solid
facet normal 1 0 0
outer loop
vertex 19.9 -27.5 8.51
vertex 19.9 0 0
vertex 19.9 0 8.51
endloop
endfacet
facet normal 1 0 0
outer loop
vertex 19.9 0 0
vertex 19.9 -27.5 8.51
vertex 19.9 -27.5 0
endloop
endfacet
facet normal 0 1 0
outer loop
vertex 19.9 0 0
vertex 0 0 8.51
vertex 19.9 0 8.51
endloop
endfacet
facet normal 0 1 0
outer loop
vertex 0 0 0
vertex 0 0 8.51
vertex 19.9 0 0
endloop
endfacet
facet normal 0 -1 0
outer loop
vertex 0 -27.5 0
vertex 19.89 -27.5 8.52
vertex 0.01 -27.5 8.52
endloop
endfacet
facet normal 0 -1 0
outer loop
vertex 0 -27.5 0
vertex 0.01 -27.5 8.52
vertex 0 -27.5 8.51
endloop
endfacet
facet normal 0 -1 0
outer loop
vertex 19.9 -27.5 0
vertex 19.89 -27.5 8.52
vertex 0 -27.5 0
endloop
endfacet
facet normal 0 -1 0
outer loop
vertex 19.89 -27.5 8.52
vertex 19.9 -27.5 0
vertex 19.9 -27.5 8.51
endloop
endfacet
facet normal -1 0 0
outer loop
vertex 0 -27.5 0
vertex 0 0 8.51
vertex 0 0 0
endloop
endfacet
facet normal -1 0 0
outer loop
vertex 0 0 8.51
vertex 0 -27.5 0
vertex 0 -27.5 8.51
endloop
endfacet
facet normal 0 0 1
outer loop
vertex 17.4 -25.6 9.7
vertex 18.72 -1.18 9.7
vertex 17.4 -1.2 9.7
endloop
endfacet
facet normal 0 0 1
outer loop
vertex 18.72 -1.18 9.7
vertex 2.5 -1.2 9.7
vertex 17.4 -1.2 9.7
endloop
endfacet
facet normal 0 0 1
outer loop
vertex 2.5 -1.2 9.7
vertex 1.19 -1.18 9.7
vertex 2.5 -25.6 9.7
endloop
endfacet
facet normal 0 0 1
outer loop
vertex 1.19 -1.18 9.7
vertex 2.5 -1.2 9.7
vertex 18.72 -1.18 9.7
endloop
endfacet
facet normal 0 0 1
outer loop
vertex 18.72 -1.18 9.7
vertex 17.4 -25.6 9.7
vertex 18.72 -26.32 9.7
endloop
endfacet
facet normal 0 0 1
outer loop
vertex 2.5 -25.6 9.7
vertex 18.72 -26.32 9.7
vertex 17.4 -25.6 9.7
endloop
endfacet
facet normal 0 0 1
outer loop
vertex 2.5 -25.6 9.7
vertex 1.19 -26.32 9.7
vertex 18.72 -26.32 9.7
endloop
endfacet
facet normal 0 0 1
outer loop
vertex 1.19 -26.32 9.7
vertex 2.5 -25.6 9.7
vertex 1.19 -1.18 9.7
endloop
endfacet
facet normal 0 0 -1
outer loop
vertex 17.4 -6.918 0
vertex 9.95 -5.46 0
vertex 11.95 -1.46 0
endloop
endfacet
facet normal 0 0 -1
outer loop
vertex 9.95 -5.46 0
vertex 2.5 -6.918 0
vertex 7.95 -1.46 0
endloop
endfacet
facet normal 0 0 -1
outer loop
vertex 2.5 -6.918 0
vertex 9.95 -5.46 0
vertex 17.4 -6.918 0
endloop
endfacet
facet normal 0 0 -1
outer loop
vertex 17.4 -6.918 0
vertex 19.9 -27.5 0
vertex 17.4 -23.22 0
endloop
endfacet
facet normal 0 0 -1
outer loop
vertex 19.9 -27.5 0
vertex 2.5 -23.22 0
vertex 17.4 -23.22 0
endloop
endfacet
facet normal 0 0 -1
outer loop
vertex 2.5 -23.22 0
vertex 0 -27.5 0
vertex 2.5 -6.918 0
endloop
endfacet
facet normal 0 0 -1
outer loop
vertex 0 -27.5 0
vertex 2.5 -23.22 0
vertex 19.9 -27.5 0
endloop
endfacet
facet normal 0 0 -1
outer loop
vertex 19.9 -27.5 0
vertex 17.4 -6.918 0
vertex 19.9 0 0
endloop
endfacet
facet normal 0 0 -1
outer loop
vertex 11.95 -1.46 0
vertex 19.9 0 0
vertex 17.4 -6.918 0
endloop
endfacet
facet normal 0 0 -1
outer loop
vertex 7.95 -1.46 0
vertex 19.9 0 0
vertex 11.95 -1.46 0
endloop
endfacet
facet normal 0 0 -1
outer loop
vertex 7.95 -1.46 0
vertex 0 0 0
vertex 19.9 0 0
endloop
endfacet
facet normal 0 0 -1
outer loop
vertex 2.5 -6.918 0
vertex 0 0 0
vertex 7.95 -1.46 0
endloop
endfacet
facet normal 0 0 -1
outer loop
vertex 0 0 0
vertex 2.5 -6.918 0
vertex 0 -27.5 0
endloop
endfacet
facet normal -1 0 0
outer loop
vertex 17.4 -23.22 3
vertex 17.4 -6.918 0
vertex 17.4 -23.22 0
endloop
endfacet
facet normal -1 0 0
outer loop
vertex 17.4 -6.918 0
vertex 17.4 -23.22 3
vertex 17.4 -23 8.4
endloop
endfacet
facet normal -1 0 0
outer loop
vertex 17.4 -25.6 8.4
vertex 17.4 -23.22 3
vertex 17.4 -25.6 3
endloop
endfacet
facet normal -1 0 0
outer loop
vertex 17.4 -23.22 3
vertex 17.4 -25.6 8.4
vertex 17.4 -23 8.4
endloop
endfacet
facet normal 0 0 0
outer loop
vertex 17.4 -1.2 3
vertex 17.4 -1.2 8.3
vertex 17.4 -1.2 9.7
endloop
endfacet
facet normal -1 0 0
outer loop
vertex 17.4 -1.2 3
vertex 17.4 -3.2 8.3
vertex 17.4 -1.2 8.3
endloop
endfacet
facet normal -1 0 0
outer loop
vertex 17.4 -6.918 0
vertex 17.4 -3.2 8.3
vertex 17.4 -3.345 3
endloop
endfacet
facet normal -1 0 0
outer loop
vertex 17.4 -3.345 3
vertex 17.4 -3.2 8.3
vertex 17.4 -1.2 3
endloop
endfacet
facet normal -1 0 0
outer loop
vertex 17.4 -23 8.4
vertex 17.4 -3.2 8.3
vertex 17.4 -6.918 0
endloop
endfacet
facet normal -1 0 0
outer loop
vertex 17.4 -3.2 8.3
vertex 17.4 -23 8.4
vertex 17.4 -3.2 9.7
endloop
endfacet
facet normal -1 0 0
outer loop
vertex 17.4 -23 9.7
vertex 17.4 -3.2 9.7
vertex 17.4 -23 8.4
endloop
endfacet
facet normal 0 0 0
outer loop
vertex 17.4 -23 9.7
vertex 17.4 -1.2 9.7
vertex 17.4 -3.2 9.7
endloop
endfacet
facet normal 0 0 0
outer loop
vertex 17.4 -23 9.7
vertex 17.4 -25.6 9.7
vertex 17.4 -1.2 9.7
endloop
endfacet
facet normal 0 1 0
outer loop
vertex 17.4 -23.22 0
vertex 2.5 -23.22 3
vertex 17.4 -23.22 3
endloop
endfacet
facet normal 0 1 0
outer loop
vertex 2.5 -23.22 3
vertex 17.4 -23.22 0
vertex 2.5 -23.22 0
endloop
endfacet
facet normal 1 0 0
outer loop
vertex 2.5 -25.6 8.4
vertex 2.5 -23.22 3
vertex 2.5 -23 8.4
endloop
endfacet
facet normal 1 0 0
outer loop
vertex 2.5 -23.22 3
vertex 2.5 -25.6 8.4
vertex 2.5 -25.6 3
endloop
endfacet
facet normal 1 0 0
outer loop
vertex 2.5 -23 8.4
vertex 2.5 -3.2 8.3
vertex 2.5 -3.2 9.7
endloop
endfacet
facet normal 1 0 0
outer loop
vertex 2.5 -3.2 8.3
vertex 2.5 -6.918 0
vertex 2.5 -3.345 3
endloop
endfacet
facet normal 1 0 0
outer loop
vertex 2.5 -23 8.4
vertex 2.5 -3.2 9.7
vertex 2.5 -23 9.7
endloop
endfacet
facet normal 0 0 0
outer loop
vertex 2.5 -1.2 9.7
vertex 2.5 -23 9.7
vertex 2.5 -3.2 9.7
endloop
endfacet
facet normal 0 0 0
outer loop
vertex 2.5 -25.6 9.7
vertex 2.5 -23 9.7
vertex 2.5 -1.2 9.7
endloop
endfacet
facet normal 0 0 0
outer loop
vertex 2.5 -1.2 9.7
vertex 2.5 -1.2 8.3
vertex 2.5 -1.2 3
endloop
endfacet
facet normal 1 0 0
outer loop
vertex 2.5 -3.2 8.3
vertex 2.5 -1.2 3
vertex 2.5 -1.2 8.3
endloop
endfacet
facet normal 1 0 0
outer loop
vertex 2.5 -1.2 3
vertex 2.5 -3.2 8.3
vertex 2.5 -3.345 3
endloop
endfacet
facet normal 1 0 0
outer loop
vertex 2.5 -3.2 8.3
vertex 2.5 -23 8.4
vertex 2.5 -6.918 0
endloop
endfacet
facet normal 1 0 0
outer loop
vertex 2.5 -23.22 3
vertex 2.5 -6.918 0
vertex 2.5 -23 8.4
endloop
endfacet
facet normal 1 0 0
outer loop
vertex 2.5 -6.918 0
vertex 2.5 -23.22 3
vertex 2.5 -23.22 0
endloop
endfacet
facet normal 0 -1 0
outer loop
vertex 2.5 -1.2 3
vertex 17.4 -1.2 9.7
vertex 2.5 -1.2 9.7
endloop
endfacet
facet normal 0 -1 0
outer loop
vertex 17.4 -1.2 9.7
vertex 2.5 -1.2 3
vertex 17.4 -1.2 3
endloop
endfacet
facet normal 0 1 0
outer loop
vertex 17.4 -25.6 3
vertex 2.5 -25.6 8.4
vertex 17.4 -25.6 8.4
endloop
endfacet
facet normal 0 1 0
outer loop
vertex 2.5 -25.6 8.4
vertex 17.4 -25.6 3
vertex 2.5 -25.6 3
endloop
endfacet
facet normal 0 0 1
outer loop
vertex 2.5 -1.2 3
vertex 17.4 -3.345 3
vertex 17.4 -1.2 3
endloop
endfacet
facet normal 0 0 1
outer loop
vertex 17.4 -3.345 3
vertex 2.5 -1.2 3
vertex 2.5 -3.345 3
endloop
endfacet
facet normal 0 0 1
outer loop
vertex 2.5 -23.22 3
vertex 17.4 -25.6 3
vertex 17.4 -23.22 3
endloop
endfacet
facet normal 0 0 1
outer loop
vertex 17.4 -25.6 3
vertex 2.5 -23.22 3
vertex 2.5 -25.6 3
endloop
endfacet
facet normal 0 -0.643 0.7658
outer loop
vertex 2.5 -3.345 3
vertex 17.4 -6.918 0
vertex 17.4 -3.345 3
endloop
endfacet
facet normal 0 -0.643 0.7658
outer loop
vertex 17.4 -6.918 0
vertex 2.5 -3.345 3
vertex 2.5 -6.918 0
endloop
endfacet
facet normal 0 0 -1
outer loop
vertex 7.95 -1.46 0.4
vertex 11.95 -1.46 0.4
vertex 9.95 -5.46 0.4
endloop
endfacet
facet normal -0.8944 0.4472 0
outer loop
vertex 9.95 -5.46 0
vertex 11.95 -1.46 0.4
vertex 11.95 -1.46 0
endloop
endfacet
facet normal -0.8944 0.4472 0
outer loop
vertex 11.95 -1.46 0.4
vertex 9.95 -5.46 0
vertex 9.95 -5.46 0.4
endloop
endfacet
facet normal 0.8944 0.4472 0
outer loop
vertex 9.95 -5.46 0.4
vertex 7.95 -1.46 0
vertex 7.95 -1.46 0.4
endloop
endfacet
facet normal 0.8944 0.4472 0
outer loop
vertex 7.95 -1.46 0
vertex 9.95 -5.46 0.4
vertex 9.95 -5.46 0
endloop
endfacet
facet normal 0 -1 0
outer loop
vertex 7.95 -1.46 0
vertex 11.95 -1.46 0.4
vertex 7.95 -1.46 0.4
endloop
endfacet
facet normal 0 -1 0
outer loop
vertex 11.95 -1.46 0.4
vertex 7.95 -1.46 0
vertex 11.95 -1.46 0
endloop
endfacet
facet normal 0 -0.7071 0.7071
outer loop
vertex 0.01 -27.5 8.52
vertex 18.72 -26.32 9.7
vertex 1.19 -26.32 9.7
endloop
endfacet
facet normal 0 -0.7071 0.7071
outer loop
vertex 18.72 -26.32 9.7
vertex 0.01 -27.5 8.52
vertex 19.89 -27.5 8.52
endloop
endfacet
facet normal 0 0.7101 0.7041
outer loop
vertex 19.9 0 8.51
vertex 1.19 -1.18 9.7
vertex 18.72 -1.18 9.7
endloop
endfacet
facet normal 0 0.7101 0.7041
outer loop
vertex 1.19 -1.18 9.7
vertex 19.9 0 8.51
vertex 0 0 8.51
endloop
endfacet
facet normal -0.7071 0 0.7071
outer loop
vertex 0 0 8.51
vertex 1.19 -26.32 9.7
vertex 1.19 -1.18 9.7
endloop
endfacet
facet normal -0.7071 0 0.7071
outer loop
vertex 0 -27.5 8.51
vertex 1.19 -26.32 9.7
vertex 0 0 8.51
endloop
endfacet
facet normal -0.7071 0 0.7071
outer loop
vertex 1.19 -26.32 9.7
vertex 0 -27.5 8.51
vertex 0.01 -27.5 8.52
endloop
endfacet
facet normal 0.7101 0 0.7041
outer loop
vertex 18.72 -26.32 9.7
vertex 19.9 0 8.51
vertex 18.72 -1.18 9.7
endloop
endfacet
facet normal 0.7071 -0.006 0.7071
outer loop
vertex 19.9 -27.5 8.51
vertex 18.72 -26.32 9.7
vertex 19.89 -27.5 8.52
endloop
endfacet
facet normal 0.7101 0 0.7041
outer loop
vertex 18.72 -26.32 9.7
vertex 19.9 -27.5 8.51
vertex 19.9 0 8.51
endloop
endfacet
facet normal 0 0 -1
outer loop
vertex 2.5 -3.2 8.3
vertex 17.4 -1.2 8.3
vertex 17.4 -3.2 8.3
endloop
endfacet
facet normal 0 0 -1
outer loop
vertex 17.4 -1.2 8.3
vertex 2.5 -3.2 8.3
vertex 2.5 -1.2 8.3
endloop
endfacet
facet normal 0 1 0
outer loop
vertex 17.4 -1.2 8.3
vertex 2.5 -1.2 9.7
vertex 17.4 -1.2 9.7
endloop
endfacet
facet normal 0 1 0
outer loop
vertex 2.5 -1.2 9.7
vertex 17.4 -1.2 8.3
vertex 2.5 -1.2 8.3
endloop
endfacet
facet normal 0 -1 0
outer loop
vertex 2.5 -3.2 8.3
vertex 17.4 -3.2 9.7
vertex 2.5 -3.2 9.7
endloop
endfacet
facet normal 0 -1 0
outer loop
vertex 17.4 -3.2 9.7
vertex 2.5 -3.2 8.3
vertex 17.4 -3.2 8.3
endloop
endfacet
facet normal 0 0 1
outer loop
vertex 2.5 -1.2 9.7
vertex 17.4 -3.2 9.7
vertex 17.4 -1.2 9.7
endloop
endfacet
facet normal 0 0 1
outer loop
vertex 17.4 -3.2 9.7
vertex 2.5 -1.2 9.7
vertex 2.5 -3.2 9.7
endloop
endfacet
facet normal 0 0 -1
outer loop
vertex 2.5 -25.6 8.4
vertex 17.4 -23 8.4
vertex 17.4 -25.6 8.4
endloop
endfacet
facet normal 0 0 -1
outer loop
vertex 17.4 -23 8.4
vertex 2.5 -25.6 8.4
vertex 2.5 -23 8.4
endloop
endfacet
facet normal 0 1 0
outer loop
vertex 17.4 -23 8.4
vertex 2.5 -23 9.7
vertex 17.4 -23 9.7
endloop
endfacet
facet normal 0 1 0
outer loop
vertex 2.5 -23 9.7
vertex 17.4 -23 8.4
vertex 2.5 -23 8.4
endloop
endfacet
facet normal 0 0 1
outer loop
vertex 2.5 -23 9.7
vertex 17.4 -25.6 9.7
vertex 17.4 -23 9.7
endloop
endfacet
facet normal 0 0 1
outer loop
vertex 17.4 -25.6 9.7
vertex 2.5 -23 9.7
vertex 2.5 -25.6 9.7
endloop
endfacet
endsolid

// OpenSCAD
print_orientation=true;
cross_section_preview=true;
module keystone(
){
    e=0.01; // epsilon for coplanar face fixes, fixes bug where some faces leave a thin sliver of material
    wall=2.5;
    front_hole_width=14.9;
    front_hole_height=16.3;
    front_hole_z_offset=4.28;
    front_hole_lip=0;

    jack_width=front_hole_width+wall;
    jack_height=25;
    jack_depth=9.7;
    front_large_catch_depth=3;
    front_chamfer_angle=50; // degrees from horizontal (depth axis)

    back_hole_height=24.4;
    back_hole_z_offset=1.9;

    back_small_catch_length=2;
    back_small_catch_depth=1.4;

    back_large_catch_length=2.6;
    back_large_catch_depth=1.3;
    
    back_chamfer=1.2;

    // Flip entire part because I accidentially desinged it upside down
    translate([0, 0, jack_height + wall]) 
    mirror([0, 0, 1]) {
        union(){
            difference(){
                // Make solid cube
                cube([jack_width+wall,jack_depth,jack_height+wall]);
            // Cut out the front hole
            translate([(jack_width+wall-front_hole_width)/2,0,front_hole_z_offset])
                color("blue")
                cube([front_hole_width,jack_depth+wall,front_hole_height]);
            // Cut out the back hole. It should be extruded to front_large_catch_depth
            translate([(jack_width+wall-front_hole_width)/2,front_large_catch_depth,back_hole_z_offset])
                color("red")
                cube([front_hole_width,jack_depth+wall-front_large_catch_depth,back_hole_height]);

            // Cut out chamfer on front face of small catch
            color("green")
            translate([wall + front_hole_width, 0, 0])
                rotate([0, -90, 0])
                    linear_extrude(front_hole_width)
                        polygon([
                            [front_hole_z_offset + front_hole_height - e, front_hole_lip - e],          // A: shifted e below catch floor to avoid coplanar artifact
                            [front_hole_z_offset + front_hole_height + (front_large_catch_depth - front_hole_lip) * tan(front_chamfer_angle), front_large_catch_depth],  // B: angle-derived point
                            [front_hole_z_offset + front_hole_height - e, front_large_catch_depth]      // C: inner corner, same e shift as A
                        ]);

            // Cut out chamefer on front face of large catch
            // color("orange")
            // translate([wall + front_hole_width, 0, 0])
            //     rotate([0, -90, 0])
            //         linear_extrude(front_hole_width)
            //             polygon([
            //                 [front_hole_z_offset+e, front_hole_lip],  // A: front face, bottom of front hole
            //                 [back_hole_z_offset,  front_large_catch_depth],     // B: inner ledge, bottom of back hole
            //                 [front_hole_z_offset, front_large_catch_depth]      // C: inner ledge, same Z as A
            //             ]);

            // Front directional triangle emboss (cut into face)
            color("yellow")
                translate([(jack_width+wall)/2, 0.4, (front_hole_z_offset + front_hole_height + jack_height + wall) / 2])
                    rotate([90, 0, 0])
                        linear_extrude(height = 0.4+e)
                            polygon([
                                [0, -2],
                                [-2, 2],
                                [2, 2]
                            ]);

            // Chamfer back bottom edge (along X)
            translate([jack_width+wall+e, 0, -e])
                rotate([0, -90, 0])
                    linear_extrude(jack_width+wall+2*e)
                        polygon([[-e, jack_depth+e], [back_chamfer, jack_depth+e], [-e, jack_depth-back_chamfer]]);

            // Chamfer back top edge (along X)
            translate([jack_width+wall+e, 0, -e])
                rotate([0, -90, 0])
                    linear_extrude(jack_width+wall+2*e)
                        polygon([[jack_height+wall+2*e, jack_depth+e], [jack_height+wall+2*e-back_chamfer, jack_depth+e], [jack_height+wall+2*e, jack_depth-back_chamfer]]);

            // Chamfer back left edge (along Z)
            translate([0, 0, -e])
                linear_extrude(jack_height+wall+2*e)
                    polygon([[-e, jack_depth+e], [back_chamfer, jack_depth+e], [-e, jack_depth-back_chamfer]]);

            // Chamfer back right edge (along Z)
            translate([0, 0, -e])
                linear_extrude(jack_height+wall+2*e)
                    polygon([[jack_width+wall+e, jack_depth+e], [jack_width+wall+e-back_chamfer, jack_depth+e], [jack_width+wall+e, jack_depth-back_chamfer]]);

            } // end difference

            // Small back catch (added geometry)
            color("purple")
                translate([wall + front_hole_width, 0, 0])
                    rotate([0, -90, 0])
                        linear_extrude(front_hole_width)
                            polygon([
                                [back_hole_z_offset + back_hole_height - back_small_catch_length, jack_depth - back_small_catch_depth],  // A
                                [back_hole_z_offset + back_hole_height,                           jack_depth - back_small_catch_depth],  // B
                                [back_hole_z_offset + back_hole_height,                           jack_depth],                           // C
                                [back_hole_z_offset + back_hole_height - back_small_catch_length, jack_depth]                            // D
                            ]);

            // Large back catch (added geometry)
            color("cyan")
                translate([wall + front_hole_width, 0, 0])
                    rotate([0, -90, 0])
                        linear_extrude(front_hole_width)
                            polygon([
                                [back_hole_z_offset,                           jack_depth - back_large_catch_depth],  // A
                                [back_hole_z_offset + back_large_catch_length, jack_depth - back_large_catch_depth],  // B
                                [back_hole_z_offset + back_large_catch_length, jack_depth],                           // C
                                [back_hole_z_offset,                           jack_depth]                            // D
                            ]);

        } // end union
    }
}


if ($preview) {
    if (cross_section_preview) {
        intersection() {
            keystone();
            cube([10, 35, 50]);
        }
    } else {
        keystone();
    }

} else {
    if (print_orientation) {
        rotate([90, 0, 0])
            keystone();
    } else {
        keystone();
    }
}
